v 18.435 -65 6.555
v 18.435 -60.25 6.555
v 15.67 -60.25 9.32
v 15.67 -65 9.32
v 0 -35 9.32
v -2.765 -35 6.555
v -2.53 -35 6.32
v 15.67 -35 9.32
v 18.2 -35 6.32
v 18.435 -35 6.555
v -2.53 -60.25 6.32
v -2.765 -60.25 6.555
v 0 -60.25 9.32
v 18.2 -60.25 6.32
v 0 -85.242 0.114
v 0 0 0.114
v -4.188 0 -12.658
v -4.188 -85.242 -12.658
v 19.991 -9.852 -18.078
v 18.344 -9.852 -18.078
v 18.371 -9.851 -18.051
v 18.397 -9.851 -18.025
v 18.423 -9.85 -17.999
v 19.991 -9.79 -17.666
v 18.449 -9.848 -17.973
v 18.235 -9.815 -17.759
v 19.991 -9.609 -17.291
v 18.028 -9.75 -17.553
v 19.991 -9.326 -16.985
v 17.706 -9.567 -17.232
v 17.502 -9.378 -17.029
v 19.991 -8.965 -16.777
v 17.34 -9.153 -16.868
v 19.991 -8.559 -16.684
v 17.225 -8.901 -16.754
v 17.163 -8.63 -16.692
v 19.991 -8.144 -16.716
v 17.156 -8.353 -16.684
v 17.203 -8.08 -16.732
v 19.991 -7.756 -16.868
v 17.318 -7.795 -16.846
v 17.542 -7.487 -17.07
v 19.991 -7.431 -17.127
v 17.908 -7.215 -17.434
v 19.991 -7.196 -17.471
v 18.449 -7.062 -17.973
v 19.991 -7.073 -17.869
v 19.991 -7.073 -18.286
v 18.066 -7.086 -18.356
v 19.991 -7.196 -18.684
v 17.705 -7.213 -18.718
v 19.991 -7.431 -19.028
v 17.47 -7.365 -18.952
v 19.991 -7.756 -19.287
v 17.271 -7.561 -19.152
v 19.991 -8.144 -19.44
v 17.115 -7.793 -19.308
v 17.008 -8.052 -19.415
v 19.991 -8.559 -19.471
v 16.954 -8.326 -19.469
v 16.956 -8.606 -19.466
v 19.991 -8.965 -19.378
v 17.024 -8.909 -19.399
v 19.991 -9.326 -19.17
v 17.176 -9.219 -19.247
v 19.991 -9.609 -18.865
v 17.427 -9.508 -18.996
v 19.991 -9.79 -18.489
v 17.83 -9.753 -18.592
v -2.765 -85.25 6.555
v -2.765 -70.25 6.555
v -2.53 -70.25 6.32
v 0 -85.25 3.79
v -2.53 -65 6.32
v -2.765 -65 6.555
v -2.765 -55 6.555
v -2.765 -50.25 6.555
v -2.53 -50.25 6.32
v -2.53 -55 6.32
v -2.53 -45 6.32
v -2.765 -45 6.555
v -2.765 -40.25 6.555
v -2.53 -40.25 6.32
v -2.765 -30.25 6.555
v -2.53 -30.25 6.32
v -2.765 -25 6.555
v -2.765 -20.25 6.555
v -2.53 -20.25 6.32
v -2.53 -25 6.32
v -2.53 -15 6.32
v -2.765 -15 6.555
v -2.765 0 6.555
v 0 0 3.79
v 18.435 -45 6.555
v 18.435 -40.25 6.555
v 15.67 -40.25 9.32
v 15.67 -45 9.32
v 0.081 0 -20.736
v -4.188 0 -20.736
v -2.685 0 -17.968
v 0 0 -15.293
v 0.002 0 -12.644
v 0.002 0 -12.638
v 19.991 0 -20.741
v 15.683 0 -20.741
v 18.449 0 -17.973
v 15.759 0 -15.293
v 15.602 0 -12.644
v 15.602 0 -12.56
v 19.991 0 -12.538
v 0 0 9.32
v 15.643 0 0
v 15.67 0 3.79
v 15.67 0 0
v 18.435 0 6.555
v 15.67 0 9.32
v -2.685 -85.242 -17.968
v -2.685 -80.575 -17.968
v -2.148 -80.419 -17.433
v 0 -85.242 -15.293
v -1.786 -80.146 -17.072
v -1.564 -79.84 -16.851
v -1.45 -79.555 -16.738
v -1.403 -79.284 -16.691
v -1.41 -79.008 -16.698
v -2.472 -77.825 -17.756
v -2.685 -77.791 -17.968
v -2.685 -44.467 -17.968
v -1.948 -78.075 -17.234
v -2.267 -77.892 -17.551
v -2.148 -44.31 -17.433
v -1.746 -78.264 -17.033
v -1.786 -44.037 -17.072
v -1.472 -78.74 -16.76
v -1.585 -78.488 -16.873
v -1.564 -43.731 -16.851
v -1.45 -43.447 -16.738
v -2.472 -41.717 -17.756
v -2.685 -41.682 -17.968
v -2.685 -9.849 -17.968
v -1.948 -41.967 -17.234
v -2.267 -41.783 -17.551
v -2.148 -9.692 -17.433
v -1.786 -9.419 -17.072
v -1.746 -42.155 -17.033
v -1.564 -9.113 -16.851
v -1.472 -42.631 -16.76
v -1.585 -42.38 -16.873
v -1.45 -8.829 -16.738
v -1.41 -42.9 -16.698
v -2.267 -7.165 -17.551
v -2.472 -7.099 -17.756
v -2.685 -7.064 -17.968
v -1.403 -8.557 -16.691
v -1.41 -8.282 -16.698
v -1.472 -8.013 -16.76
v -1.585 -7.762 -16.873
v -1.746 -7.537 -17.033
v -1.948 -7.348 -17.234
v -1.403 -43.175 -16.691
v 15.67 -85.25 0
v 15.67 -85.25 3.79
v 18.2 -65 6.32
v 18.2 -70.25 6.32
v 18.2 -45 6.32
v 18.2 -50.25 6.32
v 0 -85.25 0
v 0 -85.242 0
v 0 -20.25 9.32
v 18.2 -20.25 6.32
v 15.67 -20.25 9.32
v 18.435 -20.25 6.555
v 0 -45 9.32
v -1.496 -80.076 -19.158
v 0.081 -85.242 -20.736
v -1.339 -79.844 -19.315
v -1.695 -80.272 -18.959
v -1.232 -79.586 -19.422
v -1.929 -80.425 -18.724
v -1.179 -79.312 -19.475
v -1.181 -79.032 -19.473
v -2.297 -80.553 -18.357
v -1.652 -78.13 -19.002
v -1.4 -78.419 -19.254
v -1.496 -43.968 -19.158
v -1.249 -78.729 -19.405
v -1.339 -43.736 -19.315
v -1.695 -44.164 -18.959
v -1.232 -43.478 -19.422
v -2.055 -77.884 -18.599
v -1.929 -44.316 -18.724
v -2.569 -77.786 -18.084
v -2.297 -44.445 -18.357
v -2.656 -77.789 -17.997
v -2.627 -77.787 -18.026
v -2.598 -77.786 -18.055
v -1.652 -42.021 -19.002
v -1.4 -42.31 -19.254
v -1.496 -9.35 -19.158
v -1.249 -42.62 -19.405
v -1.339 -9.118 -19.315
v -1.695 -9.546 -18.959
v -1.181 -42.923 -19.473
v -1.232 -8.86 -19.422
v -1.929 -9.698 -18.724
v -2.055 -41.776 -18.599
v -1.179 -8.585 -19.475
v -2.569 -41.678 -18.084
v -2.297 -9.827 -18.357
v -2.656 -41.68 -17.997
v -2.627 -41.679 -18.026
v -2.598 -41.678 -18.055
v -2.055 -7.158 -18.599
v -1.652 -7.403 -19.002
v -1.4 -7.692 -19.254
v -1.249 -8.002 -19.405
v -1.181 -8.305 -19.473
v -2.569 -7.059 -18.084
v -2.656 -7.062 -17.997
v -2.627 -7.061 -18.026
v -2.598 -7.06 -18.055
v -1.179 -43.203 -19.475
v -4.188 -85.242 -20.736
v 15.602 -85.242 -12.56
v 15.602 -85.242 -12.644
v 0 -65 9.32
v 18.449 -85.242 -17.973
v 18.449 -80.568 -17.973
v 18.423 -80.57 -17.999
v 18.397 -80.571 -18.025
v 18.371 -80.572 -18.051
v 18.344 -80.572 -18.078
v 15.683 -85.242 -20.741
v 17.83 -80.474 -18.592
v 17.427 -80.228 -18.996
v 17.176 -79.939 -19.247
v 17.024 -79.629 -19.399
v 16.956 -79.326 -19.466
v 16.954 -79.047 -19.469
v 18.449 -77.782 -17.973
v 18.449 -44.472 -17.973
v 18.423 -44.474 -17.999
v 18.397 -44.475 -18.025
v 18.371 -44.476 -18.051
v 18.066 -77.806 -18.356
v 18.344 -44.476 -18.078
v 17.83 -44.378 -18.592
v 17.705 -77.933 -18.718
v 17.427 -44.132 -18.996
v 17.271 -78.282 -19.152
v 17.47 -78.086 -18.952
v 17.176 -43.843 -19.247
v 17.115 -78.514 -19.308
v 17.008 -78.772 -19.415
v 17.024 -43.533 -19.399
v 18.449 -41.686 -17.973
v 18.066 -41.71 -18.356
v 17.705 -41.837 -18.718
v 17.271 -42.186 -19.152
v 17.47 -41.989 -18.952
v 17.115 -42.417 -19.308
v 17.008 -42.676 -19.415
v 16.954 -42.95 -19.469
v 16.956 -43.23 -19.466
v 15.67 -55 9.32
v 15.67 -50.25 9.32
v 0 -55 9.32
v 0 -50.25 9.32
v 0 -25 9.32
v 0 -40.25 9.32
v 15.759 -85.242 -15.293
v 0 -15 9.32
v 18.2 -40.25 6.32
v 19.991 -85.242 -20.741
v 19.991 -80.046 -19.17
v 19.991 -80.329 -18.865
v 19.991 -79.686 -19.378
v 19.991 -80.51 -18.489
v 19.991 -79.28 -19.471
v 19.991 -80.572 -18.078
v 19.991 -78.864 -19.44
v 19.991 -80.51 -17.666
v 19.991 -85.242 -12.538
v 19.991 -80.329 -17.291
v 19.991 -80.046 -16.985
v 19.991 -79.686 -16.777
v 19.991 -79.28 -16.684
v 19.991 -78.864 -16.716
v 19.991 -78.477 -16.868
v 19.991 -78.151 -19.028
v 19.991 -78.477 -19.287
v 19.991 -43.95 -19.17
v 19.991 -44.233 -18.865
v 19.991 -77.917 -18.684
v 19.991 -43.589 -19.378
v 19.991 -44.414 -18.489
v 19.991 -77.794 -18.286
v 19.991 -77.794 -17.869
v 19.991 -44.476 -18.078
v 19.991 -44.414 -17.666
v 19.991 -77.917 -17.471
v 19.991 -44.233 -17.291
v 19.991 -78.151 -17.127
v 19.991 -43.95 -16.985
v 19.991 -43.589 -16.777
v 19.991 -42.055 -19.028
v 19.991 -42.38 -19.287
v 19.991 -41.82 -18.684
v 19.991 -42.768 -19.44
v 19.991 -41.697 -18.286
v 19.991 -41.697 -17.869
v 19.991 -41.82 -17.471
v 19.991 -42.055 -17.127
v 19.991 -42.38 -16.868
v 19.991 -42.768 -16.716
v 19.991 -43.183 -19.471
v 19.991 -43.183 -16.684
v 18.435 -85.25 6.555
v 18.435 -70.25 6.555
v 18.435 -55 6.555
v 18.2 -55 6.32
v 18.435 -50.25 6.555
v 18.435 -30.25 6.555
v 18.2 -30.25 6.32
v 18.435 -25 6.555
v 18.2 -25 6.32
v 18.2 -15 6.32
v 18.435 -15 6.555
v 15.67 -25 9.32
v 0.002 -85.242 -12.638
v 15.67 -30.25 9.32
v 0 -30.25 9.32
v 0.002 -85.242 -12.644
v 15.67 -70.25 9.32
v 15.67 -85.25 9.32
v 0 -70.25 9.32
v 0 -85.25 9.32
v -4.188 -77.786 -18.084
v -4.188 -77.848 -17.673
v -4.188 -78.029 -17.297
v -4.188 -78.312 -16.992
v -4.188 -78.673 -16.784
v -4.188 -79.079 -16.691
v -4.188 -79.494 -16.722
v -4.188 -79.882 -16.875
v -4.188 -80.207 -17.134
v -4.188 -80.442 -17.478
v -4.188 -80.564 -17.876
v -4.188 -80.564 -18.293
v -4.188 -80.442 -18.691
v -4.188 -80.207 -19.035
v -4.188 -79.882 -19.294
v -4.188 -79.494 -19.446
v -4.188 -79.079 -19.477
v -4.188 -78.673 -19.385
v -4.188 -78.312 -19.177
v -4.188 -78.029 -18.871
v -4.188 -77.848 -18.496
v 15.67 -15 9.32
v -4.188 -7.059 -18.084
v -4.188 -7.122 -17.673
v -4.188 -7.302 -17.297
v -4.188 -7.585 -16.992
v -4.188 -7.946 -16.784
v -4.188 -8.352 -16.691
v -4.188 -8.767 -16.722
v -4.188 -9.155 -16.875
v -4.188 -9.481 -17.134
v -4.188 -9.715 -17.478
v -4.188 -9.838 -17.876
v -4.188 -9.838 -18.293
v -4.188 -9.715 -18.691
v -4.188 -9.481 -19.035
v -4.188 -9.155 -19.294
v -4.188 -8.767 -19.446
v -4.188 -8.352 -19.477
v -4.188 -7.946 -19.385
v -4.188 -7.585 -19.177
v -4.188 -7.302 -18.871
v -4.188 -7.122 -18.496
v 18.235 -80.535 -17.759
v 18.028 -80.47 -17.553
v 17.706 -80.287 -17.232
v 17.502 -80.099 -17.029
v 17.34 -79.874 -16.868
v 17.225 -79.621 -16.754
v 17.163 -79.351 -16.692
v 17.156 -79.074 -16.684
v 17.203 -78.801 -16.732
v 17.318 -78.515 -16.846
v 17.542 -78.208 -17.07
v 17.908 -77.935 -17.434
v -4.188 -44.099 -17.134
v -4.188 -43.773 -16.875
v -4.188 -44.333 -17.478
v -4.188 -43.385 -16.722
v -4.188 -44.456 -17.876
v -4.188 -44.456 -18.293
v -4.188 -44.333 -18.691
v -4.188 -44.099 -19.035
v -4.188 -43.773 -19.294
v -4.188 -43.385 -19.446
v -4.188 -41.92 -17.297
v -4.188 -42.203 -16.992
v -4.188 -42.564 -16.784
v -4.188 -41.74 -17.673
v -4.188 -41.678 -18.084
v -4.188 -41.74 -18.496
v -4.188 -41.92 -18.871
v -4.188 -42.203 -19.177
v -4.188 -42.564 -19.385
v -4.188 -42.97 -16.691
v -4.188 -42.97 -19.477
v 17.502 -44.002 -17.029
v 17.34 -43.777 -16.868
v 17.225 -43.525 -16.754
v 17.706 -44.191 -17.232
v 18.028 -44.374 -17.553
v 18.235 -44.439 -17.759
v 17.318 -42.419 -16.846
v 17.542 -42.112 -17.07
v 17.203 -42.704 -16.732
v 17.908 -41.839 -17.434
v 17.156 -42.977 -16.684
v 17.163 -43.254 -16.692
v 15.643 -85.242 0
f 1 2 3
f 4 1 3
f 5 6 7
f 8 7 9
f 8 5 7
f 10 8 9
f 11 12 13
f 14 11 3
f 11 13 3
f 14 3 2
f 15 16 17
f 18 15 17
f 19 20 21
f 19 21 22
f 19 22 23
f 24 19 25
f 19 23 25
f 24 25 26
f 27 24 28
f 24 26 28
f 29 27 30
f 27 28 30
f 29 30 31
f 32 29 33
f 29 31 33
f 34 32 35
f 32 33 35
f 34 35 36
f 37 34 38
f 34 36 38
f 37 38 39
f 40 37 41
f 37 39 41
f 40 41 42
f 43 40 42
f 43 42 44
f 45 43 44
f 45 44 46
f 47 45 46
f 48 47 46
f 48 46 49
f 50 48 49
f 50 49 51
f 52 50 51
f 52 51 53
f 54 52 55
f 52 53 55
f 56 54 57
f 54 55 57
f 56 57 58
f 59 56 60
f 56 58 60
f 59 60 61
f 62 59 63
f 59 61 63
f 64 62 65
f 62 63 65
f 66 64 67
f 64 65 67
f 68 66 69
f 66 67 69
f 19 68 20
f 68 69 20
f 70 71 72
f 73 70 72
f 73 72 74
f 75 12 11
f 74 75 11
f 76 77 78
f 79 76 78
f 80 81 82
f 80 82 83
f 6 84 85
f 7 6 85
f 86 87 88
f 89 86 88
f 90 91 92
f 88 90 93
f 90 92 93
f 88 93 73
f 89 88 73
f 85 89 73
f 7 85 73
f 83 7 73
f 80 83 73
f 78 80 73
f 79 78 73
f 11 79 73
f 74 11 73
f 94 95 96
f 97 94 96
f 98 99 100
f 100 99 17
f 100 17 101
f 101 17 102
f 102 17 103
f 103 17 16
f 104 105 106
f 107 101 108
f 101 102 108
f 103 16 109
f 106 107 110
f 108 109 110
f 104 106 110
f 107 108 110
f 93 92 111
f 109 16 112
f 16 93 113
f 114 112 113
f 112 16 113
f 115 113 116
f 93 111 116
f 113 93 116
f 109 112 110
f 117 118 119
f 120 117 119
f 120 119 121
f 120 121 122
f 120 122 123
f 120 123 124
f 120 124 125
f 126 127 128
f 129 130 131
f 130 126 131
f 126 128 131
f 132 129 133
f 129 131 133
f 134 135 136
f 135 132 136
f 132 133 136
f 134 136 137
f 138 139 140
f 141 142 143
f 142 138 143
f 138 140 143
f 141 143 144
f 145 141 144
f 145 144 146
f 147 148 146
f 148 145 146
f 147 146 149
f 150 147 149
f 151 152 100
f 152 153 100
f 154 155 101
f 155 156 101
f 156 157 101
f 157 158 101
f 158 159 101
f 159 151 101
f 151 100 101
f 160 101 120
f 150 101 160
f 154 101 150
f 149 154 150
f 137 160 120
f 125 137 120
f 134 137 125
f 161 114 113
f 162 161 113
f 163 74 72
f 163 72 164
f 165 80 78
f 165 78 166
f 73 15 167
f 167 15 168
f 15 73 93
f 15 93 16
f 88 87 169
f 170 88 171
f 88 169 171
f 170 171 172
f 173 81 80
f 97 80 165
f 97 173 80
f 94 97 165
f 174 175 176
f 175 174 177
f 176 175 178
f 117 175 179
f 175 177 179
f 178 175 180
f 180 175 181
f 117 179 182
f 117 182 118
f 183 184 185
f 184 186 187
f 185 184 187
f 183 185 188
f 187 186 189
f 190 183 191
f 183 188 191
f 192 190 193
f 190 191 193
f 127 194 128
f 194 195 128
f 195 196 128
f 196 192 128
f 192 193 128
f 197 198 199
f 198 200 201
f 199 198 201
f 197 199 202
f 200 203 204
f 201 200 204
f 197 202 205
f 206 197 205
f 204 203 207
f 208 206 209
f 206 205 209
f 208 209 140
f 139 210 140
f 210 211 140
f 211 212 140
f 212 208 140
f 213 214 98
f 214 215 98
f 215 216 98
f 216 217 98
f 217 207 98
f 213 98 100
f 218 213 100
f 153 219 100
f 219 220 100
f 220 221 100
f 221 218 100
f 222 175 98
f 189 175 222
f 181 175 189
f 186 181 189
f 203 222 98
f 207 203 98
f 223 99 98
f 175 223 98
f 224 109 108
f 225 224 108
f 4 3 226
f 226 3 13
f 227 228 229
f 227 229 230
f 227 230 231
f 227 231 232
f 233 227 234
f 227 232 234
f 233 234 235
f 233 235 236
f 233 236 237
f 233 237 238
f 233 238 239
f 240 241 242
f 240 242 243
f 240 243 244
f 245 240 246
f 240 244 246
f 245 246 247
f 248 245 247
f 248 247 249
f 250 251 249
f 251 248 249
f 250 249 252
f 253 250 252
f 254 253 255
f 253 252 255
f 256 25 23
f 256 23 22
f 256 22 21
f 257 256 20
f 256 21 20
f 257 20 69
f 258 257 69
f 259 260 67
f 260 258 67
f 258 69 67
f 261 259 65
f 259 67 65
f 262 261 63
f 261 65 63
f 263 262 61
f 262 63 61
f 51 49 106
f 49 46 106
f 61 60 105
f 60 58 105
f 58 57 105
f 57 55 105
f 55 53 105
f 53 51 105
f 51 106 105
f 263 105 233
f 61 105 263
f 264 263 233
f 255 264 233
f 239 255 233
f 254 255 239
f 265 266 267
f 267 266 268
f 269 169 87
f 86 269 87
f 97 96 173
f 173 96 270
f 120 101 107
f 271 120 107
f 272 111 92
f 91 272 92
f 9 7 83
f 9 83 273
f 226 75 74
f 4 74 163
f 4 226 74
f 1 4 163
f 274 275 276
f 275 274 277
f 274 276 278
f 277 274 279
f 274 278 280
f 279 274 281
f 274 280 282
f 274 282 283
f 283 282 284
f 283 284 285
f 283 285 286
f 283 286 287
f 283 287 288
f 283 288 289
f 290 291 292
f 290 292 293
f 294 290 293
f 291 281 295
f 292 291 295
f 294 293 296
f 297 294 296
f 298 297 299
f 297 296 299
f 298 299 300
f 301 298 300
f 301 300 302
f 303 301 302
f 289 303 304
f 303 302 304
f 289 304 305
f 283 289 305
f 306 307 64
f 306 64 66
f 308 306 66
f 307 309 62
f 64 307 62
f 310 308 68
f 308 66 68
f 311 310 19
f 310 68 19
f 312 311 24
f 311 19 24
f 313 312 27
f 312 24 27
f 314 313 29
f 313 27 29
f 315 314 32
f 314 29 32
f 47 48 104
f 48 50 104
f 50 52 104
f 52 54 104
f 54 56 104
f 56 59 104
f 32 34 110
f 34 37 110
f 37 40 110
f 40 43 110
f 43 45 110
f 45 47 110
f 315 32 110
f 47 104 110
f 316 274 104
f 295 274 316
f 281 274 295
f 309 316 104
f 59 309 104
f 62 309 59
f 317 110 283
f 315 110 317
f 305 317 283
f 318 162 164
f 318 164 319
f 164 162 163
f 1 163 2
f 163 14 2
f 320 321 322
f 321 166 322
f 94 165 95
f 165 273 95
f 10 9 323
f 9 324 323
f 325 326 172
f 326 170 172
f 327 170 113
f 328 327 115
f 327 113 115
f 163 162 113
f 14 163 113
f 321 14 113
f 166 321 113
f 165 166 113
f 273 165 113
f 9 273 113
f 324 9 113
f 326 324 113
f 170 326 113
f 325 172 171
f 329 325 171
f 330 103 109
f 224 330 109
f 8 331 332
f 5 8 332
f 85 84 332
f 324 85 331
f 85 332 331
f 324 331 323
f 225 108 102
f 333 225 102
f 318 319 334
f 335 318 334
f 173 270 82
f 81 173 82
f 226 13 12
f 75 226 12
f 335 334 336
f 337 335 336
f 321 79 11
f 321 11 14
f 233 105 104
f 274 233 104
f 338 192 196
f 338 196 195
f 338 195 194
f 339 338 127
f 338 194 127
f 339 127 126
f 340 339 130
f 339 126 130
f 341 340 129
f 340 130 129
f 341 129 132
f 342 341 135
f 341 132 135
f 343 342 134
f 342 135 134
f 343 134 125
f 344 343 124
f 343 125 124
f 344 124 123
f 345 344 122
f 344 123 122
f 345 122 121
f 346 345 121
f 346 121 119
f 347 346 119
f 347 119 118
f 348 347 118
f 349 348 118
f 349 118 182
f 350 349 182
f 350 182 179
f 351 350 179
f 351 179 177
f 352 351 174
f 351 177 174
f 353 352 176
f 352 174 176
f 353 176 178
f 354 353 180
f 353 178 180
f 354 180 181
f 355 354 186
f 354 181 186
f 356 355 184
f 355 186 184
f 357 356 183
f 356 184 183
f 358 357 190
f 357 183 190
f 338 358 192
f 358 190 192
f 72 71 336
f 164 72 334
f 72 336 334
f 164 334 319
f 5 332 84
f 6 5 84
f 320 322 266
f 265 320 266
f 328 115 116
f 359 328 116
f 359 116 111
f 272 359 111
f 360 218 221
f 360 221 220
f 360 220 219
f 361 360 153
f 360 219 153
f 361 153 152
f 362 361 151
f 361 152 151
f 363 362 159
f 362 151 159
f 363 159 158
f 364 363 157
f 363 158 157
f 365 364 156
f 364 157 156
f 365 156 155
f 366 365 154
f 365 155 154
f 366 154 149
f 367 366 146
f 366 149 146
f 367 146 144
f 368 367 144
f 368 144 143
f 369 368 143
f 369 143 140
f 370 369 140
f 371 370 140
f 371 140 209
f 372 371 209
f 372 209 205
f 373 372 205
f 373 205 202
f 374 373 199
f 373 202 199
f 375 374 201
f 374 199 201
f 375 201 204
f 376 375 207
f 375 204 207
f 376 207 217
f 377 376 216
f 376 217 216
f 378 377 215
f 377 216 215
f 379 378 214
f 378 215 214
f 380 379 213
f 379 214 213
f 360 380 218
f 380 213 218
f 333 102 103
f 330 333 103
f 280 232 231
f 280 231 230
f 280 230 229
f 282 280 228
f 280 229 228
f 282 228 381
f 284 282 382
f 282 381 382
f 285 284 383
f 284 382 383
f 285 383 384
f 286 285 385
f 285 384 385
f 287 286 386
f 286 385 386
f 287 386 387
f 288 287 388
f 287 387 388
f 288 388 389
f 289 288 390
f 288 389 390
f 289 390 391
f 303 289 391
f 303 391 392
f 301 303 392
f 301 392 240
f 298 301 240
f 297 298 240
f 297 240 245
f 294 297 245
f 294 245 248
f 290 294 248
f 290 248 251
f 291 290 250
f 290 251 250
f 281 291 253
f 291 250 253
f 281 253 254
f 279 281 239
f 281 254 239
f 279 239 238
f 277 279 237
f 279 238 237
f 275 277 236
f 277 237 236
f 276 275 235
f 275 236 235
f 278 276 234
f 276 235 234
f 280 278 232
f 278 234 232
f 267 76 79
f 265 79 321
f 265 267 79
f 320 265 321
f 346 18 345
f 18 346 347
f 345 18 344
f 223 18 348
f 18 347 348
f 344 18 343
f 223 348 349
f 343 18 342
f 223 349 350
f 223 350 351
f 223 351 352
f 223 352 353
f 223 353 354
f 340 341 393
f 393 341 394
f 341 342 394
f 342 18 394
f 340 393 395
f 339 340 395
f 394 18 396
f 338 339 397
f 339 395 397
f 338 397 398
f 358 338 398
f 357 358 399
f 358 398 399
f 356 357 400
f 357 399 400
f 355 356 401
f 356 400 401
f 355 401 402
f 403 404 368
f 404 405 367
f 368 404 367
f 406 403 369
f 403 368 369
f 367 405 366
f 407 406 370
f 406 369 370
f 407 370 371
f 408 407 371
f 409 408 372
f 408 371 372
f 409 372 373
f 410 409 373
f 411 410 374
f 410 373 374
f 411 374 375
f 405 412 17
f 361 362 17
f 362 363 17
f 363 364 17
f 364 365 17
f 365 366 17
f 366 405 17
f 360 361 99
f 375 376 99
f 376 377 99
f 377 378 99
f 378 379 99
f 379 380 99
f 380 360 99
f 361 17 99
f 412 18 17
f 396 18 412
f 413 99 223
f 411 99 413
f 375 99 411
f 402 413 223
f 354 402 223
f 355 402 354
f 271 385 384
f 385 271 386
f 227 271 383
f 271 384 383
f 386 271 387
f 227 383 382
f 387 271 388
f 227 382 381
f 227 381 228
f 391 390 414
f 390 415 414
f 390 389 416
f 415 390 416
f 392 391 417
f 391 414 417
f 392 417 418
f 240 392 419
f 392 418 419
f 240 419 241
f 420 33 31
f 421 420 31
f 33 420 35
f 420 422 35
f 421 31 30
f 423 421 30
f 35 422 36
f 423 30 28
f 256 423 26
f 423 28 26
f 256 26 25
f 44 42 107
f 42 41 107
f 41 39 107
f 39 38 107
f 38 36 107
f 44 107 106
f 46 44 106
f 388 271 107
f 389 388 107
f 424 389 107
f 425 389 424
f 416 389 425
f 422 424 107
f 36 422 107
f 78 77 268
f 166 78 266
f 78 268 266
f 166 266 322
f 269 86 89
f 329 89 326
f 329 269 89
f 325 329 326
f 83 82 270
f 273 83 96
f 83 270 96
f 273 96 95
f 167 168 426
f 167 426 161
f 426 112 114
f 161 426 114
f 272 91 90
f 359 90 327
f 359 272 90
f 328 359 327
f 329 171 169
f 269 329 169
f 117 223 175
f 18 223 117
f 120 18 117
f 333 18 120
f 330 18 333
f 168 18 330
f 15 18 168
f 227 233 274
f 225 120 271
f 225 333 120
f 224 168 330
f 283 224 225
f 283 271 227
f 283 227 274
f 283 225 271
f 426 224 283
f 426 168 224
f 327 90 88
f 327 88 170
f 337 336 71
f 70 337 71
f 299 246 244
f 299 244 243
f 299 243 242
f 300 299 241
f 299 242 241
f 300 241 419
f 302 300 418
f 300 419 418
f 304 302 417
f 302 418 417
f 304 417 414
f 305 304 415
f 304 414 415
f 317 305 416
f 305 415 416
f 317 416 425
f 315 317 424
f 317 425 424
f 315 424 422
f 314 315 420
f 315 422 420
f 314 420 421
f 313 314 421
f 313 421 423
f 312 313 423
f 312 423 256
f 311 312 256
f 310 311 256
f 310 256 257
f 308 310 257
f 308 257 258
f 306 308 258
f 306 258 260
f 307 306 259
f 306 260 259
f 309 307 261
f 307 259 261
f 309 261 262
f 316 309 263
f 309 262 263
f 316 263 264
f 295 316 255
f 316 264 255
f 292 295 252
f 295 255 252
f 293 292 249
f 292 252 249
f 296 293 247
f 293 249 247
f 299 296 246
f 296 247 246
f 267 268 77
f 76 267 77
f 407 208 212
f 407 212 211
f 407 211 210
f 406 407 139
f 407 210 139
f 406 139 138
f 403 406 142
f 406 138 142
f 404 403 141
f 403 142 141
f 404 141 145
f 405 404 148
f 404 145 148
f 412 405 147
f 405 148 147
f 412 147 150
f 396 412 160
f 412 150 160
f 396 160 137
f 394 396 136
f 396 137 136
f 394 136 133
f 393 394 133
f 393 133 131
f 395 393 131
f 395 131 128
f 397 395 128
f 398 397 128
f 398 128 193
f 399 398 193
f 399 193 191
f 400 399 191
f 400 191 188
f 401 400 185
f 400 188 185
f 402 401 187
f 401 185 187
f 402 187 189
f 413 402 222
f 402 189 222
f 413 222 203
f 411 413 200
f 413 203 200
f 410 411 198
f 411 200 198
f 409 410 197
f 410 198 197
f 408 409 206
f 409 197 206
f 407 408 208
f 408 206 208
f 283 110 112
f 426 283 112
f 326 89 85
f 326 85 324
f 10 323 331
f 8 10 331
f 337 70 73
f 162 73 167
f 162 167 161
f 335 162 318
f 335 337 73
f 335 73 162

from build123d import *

# Parameters (mm, degrees)
F1_DEPTH       = 85.25
F2_W           = 55.8218845766
F2_H           = 5.25
F3_DEPTH       = 3
F5_DEPTH       = 85.2424
F8_D           = 2.794
F8_DEPTH       = 12.7
F8_TIP         = 0.8394022848
F8_ON_F7_D     = 2.794
F8_ON_F7_DEPTH = 12.7
F8_ON_F7_TIP   = 0.8394022848


with BuildPart() as f1:
    # F0 (on Front) → F1 (new body)
    with BuildSketch(Plane.XZ):
        Polygon((0, 3.79), (0, 0), (15.67, 0), (15.67, 3.79), (18.435, 6.555), (15.67, 9.32), (0, 9.32), (-2.765, 6.555), align=None)
    extrude(amount=F1_DEPTH)

    # F2 (on face) → F3 (cut)
    with BuildSketch(Plane.XY.offset(9.32)):
        with Locations((8.2114636898, -17.625)):
            Rectangle(F2_W, F2_H)
        with Locations((8.2114636898, -27.625)):
            Rectangle(F2_W, F2_H)
        with Locations((8.2114636898, -37.625)):
            Rectangle(F2_W, F2_H)
        with Locations((8.2114636898, -47.625)):
            Rectangle(F2_W, F2_H)
        with Locations((8.2114636898, -57.625)):
            Rectangle(F2_W, F2_H)
        with Locations((8.2114636898, -67.625)):
            Rectangle(F2_W, F2_H)
    extrude(amount=-F3_DEPTH, mode=Mode.SUBTRACT)

    # F4 (on Front) → F5 (join)
    with BuildSketch(Plane.XZ):
        Polygon((0.0019754424, -12.6376101786), (15.6015763059, -12.5601905993), (15.6015763059, 0), (15.6015763059, 0.1199992985), (0.0019754424, 0.1199992985), (0.0019754424, -2.5521272328), align=None)
        Polygon((18.4492052038, -17.9727599025), (15.6827729632, -20.7406985573), (19.9911782954, -20.7406985573), (19.9911782954, -12.5384053536), (15.6015763059, -12.5601905993), (15.6015763059, -12.6442629844), (0.0019754424, -12.6442629844), (0.0019754424, -12.6376101786), (-4.1879916127, -12.658404652), (-4.1879916127, -20.7361024804), (0.0811966573, -20.7361024804), (-2.6852355834, -17.9681638256), (0, -15.2933802456), (15.7593555839, -15.2933802456), align=None)
        Polygon((15.6015763059, -12.5601905993), (19.9911782954, -12.5384053536), (15.6015763059, 0.1199992985), (15.6015763059, 0), align=None)
        Polygon((-4.1879916127, -12.658404652), (0.0019754424, -12.6376101786), (0.0019754424, -2.5521272328), (0.0019754424, 0.1199992985), align=None)
    extrude(amount=F5_DEPTH)

    # F8 (one way)
    with BuildSketch(Plane.YZ):
        with Locations((-79.1830047965, -18.0843956769), (-43.074503541, -18.0843956769), (-8.4564629942, -18.0843956769)):
            Circle(F8_D / 2)
    extrude(amount=-F8_DEPTH, mode=Mode.SUBTRACT)
    with Locations(Plane.YZ):
        with Locations((-79.1830047965, -18.0843956769), (-43.074503541, -18.0843956769), (-8.4564629942, -18.0843956769)):
            with Locations((0, 0, -(F8_DEPTH + F8_TIP / 2))):  # 118° drill point
                Cone(0, F8_D / 2, F8_TIP, mode=Mode.SUBTRACT)

    # F8 on F7
    with Locations(Plane.YZ.offset(19.9911782954)):
        with Locations((-79.1751816869, -18.0775541812), (-43.0787950754, -18.0775541812), (-8.4547195584, -18.0775541812)):
            Hole(F8_ON_F7_D / 2, depth=F8_ON_F7_DEPTH)
            with Locations((0, 0, -(F8_ON_F7_DEPTH + F8_ON_F7_TIP / 2))):  # 118° drill point
                Cone(0, F8_ON_F7_D / 2, F8_ON_F7_TIP, mode=Mode.SUBTRACT)


solid = f1.part
